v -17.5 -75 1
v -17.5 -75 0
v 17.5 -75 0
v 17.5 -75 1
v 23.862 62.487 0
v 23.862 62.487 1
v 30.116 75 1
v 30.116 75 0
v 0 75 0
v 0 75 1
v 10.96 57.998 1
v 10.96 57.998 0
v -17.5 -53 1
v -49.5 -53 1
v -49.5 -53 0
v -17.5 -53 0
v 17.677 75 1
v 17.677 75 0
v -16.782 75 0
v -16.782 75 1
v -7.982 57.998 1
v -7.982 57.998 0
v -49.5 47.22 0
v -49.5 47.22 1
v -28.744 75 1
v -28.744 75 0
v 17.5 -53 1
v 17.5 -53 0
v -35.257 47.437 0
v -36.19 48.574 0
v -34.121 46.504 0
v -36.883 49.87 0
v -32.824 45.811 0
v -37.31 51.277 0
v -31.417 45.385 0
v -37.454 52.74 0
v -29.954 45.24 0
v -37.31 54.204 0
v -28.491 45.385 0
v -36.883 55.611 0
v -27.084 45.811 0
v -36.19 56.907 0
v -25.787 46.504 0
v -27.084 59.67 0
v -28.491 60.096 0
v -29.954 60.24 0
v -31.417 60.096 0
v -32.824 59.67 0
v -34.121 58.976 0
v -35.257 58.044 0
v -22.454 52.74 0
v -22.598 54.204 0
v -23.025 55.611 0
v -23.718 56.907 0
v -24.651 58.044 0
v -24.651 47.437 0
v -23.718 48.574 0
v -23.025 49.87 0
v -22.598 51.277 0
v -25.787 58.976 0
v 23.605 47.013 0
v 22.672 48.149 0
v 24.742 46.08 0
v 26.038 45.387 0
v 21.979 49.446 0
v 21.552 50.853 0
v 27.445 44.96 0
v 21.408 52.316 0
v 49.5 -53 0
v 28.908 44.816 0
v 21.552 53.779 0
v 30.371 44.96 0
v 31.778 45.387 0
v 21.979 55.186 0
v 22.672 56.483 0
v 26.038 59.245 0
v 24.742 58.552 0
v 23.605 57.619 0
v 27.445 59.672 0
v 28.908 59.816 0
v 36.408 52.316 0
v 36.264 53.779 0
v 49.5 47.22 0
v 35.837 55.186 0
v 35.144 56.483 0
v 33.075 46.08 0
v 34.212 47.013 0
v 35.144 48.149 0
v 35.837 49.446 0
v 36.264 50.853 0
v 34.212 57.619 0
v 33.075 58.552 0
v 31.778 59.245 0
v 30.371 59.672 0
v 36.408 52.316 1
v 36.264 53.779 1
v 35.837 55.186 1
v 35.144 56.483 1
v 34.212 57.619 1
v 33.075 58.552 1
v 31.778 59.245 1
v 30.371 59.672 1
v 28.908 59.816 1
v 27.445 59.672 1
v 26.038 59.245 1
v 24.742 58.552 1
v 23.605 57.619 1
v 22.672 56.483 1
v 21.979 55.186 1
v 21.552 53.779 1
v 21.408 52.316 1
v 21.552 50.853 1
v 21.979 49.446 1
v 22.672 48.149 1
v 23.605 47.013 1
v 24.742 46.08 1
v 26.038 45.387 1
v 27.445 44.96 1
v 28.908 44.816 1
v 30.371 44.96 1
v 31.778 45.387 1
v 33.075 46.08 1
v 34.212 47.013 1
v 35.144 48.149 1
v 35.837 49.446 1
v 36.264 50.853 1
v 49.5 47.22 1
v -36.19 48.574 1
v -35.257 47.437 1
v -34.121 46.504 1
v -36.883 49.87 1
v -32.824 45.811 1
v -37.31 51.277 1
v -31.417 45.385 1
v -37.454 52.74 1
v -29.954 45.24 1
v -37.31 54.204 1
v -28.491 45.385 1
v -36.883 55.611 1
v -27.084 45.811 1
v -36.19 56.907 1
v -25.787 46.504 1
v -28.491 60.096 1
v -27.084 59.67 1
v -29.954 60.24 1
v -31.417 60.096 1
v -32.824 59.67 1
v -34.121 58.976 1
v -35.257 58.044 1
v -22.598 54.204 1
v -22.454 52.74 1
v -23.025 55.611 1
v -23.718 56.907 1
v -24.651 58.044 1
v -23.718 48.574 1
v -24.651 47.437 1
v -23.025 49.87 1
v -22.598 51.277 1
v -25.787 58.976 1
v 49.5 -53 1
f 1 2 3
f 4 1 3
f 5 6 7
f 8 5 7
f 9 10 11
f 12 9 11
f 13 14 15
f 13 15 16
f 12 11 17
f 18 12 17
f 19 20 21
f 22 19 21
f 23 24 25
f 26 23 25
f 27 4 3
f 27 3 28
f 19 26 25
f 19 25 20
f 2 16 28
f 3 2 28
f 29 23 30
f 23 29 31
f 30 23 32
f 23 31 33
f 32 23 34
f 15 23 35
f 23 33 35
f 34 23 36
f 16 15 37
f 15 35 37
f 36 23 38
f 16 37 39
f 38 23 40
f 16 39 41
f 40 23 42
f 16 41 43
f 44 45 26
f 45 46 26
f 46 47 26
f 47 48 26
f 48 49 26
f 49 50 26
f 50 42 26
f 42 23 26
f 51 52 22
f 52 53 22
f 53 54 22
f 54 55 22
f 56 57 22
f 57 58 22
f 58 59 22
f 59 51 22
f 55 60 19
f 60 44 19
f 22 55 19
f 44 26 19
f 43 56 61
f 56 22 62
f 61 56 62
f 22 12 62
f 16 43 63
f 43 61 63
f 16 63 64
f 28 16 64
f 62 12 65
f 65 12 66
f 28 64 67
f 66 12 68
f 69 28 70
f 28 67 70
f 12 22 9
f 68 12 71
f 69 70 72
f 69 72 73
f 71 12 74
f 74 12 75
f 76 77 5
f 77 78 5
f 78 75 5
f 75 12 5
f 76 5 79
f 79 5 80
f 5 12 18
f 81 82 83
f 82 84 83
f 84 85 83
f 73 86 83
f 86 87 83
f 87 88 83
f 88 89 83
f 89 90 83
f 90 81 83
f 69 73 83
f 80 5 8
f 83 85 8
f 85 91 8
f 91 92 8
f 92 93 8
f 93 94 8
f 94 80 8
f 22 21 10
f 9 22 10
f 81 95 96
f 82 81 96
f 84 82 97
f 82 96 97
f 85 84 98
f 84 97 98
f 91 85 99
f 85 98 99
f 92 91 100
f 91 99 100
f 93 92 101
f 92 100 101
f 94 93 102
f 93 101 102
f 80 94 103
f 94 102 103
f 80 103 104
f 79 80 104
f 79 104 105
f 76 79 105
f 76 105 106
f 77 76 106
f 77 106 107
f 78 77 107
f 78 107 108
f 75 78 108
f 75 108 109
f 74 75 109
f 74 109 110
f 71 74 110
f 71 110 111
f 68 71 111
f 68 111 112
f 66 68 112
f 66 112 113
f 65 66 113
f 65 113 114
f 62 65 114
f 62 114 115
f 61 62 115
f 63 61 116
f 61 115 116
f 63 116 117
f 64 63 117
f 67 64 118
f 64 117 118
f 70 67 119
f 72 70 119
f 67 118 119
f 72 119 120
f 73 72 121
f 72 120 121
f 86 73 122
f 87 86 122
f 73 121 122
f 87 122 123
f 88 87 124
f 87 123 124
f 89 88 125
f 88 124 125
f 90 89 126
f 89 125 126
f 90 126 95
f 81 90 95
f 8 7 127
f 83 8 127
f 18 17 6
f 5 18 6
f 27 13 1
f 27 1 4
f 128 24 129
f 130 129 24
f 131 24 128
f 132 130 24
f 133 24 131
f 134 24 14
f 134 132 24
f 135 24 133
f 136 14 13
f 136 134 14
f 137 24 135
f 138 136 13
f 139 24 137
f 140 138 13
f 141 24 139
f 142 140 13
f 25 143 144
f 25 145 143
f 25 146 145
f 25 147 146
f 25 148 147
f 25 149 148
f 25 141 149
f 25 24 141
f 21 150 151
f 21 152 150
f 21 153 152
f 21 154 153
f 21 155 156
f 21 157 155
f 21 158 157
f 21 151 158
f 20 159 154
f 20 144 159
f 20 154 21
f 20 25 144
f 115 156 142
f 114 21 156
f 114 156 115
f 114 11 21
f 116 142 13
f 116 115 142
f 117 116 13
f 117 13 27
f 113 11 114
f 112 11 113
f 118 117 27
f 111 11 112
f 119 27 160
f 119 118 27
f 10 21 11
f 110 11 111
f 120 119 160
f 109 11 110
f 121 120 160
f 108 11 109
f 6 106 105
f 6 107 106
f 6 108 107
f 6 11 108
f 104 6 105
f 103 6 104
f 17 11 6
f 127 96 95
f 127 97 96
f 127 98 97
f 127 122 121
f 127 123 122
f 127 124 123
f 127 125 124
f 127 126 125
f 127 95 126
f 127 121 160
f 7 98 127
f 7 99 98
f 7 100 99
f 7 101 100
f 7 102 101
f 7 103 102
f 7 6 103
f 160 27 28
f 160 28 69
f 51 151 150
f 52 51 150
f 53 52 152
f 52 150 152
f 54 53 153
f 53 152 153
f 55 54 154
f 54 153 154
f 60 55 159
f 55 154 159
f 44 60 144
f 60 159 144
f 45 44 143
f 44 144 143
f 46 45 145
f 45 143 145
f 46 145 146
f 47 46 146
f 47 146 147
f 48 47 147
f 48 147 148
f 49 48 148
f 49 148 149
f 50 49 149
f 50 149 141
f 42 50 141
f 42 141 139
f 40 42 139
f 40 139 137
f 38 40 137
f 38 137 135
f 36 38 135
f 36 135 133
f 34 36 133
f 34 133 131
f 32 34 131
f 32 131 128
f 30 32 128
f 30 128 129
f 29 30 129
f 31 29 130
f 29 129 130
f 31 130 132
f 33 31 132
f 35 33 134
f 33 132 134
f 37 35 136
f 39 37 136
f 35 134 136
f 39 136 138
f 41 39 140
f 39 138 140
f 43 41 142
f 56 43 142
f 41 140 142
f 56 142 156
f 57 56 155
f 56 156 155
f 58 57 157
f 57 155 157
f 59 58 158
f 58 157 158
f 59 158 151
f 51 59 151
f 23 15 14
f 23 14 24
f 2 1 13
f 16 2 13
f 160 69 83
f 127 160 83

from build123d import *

# Parameters (mm, degrees)
F0_W     = 99
F0_H     = 150
F1_DEPTH = 1
F3_DEPTH = 25
F2_R     = 7.5
F2_W     = 32
F2_H     = 22
F4_DEPTH = 25
F5_DEPTH = 25


with BuildPart() as f1:
    # F0 (on Top) → F1 (new body)
    with BuildSketch(Plane.XY):
        Rectangle(F0_W, F0_H)
    extrude(amount=F1_DEPTH)

    # F2 (on face) → F3 (cut)
    with BuildSketch(Plane.XY.offset(1)):
        Polygon((30.116405, 75), (49.5, 47.219642), (49.5, 75), align=None)
        Polygon((-49.5, 47.219642), (-28.743548, 75), (-49.5, 75), align=None)
        Polygon((10.960037, 57.998028), (17.677084, 75), (0, 75), align=None)
        Polygon((23.862131, 62.487412), (30.116405, 75), (17.677084, 75), align=None)
        Polygon((-7.982026, 57.998028), (0, 75), (-16.782477, 75), align=None)
    extrude(amount=-F3_DEPTH, mode=Mode.SUBTRACT)

    # F2 (on face) → F4 (cut)
    with BuildSketch(Plane.XY.offset(1)):
        with Locations((-29.954113, 52.740462)):
            Circle(F2_R)
        with Locations((-33.5, -64)):
            Rectangle(F2_W, F2_H)
        with Locations((33.5, -64)):
            Rectangle(F2_W, F2_H)
        with Locations((28.908281, 52.315958)):
            Circle(F2_R)
    extrude(amount=-F4_DEPTH, mode=Mode.SUBTRACT)

    # F2 (on face) → F5 (cut)
    with BuildSketch(Plane.XY.offset(1)):
        with Locations((33.5, -64)):
            Rectangle(F2_W, F2_H)
        with Locations((-33.5, -64)):
            Rectangle(F2_W, F2_H)
    extrude(amount=-F5_DEPTH, mode=Mode.SUBTRACT)


solid = f1.part
